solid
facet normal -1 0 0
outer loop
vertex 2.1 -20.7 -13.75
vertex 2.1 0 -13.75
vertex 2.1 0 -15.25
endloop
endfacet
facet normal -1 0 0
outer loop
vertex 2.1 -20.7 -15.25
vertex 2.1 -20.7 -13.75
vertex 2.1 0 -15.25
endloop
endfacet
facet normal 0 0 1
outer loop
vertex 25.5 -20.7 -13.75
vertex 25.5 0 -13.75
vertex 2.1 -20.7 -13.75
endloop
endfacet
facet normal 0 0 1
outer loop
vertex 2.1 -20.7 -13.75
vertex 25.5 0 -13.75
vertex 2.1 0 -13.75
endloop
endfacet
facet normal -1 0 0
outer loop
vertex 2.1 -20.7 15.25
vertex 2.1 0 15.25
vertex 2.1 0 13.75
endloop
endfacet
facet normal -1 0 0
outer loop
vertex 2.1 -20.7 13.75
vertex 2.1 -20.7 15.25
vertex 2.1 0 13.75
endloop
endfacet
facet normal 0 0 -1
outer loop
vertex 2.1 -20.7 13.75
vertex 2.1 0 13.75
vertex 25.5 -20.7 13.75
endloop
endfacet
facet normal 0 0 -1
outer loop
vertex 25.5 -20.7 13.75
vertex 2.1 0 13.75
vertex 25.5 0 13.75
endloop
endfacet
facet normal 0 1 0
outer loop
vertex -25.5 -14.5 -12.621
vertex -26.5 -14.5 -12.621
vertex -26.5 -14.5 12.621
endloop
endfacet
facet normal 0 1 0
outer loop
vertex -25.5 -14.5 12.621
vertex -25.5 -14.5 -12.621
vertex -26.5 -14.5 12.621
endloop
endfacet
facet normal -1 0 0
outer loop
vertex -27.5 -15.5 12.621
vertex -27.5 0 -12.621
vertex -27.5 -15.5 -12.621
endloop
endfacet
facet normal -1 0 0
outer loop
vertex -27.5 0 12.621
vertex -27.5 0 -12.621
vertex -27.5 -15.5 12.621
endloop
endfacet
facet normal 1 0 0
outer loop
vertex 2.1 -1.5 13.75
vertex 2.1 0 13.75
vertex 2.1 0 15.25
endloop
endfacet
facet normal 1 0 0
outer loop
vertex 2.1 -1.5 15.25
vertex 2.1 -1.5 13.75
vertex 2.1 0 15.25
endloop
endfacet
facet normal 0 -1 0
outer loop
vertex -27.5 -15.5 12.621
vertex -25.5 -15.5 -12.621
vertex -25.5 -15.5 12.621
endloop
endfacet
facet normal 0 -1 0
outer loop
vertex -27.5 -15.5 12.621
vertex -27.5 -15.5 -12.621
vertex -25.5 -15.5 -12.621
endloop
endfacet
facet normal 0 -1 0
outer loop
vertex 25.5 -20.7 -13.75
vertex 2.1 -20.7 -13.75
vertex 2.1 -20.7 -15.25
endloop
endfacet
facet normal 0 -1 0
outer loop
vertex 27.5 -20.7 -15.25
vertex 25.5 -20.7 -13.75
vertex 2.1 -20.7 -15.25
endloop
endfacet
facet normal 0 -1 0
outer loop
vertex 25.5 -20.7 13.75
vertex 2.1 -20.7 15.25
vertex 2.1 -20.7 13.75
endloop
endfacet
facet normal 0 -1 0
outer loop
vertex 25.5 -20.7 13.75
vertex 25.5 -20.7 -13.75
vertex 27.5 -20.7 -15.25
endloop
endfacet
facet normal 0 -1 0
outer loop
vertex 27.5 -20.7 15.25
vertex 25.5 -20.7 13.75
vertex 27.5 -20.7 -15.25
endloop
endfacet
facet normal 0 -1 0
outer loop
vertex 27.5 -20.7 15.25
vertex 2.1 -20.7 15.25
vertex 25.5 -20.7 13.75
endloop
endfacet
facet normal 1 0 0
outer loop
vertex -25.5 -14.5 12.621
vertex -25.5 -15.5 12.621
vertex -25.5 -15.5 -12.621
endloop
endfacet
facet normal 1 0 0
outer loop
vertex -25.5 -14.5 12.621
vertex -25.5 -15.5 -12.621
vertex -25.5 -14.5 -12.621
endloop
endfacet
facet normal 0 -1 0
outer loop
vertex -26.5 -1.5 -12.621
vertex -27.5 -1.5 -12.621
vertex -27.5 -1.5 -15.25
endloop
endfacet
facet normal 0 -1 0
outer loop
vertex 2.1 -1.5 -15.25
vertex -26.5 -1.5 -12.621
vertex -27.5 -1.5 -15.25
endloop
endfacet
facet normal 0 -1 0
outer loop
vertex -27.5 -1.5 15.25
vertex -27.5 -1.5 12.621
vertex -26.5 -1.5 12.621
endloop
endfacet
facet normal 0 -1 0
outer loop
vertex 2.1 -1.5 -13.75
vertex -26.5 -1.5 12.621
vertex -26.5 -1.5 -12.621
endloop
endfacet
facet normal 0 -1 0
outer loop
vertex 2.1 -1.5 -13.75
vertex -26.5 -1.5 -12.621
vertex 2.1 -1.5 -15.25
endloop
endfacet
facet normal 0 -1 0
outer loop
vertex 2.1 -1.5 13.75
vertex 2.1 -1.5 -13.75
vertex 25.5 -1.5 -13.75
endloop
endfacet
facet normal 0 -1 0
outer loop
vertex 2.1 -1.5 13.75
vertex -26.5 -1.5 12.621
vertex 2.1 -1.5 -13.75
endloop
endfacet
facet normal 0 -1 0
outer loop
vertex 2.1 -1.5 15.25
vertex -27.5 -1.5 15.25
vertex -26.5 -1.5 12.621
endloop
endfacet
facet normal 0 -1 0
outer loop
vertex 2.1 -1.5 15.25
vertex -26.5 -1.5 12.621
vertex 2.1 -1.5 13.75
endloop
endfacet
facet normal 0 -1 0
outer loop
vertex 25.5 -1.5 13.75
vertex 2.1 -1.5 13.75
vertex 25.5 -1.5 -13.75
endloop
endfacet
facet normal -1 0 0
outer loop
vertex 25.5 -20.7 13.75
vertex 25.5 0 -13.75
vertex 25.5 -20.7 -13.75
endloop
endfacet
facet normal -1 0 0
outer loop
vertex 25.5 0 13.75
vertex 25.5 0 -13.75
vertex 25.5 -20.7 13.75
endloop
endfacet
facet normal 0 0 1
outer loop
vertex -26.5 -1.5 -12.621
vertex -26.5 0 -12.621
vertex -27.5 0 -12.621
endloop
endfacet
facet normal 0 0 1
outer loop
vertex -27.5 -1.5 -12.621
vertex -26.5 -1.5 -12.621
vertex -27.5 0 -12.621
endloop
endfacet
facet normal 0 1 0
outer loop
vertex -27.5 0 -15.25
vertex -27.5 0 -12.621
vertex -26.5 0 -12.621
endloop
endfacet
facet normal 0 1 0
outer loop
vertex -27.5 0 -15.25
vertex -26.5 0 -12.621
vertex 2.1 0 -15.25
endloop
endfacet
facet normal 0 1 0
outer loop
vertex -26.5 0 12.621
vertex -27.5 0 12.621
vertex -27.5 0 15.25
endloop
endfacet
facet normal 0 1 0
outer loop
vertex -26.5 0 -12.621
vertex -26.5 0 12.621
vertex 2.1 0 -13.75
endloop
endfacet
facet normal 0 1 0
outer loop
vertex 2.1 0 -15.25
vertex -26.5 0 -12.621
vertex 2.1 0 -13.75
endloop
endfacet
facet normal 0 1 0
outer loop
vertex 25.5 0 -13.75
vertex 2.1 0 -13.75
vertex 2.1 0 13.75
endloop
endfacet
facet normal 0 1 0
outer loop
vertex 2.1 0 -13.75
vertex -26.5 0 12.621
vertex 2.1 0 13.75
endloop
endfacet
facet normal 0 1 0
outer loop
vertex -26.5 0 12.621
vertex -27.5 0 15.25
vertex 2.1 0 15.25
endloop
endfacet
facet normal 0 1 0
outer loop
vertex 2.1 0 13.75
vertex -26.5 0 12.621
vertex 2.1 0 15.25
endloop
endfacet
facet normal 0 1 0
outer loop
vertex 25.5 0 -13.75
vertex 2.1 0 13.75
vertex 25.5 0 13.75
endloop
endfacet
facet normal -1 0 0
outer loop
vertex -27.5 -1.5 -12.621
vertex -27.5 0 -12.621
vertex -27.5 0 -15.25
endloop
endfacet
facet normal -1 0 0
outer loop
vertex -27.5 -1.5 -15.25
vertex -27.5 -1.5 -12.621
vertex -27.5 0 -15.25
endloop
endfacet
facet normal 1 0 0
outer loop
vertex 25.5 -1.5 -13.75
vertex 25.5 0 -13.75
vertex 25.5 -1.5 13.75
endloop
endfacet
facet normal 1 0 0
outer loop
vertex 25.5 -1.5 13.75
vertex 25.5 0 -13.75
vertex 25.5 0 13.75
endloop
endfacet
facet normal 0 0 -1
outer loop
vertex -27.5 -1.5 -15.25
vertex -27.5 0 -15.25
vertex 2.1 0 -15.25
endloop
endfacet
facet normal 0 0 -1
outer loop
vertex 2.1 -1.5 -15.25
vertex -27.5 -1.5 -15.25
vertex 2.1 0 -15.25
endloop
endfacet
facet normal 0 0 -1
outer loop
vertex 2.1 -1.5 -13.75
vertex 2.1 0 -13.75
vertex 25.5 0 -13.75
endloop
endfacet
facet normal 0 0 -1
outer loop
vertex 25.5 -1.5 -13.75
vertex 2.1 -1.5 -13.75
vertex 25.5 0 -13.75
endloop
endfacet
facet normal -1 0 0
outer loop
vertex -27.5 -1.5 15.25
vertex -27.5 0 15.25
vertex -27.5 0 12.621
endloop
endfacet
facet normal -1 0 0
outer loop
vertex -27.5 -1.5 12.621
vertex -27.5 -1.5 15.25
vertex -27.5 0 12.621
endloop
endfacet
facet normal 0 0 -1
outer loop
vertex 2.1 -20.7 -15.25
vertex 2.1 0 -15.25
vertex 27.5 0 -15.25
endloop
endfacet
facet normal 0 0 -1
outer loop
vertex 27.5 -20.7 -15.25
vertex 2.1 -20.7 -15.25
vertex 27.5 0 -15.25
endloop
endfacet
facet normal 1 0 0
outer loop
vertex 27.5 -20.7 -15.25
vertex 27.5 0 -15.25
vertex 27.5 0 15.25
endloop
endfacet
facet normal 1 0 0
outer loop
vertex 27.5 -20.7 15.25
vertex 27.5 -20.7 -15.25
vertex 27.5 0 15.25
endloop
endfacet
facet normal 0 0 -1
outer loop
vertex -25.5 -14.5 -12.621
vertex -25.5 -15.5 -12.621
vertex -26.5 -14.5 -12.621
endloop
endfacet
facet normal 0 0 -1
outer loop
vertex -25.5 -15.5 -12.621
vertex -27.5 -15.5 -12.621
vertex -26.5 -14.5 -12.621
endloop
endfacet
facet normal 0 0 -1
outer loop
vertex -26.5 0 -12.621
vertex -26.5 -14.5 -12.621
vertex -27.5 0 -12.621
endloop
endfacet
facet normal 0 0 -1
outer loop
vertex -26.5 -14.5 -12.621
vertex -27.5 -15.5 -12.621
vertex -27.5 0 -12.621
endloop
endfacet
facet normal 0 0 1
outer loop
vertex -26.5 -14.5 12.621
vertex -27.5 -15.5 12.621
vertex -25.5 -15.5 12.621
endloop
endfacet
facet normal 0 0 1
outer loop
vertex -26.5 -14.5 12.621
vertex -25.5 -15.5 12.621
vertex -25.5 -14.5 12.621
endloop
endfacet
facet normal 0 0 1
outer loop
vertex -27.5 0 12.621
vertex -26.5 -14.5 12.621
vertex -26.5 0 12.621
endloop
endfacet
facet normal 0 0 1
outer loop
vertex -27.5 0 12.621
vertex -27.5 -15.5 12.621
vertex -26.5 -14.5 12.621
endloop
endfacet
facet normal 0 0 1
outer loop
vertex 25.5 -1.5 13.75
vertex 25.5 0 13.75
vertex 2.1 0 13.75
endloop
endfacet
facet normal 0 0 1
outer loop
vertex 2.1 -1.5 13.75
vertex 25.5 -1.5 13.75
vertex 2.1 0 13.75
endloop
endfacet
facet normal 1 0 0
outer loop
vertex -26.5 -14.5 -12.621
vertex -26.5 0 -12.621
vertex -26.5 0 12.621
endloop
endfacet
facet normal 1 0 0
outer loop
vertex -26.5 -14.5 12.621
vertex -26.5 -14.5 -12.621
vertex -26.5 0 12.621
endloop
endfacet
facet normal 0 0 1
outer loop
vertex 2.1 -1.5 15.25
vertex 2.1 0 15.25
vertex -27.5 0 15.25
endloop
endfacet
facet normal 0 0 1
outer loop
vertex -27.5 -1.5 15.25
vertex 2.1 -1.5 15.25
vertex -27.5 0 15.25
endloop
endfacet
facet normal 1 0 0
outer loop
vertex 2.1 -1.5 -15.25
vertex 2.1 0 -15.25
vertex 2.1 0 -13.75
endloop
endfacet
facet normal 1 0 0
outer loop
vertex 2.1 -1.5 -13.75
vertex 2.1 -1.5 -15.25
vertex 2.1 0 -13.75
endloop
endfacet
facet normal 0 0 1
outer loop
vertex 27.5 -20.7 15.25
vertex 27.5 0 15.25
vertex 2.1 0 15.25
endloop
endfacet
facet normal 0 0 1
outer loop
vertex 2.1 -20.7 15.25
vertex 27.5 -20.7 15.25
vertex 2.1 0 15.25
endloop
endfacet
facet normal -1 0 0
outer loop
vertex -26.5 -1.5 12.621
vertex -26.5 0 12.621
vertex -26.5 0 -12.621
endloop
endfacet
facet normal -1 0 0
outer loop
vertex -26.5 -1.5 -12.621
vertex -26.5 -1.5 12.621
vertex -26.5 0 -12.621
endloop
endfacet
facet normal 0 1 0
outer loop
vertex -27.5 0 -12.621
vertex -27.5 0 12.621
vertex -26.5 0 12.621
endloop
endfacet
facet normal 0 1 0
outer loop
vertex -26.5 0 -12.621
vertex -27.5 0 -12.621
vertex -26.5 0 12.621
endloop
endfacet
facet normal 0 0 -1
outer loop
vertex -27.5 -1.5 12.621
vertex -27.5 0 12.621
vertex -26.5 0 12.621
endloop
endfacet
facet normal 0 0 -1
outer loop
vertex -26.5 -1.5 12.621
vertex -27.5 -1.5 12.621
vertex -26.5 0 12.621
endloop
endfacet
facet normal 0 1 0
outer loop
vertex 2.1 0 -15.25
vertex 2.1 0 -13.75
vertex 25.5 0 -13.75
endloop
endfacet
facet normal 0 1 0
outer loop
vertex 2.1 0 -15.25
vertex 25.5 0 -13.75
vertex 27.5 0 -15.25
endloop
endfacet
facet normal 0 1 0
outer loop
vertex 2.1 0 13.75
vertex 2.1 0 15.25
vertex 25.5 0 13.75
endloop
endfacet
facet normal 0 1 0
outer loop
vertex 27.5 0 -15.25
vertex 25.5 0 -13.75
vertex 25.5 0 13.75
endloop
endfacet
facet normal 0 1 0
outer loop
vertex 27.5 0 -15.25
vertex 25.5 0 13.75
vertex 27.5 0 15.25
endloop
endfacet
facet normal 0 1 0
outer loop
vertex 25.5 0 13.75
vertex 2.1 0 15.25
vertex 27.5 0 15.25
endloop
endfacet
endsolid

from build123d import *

# Parameters (mm, degrees)
F0_W     = 1
F0_H     = 25.24283
F1_DEPTH = 15.5
F0_W_2   = 2
F0_H_2   = 27.5
F2_DEPTH = 20.7
F3_DEPTH = 1.5
F4_W     = 1
F4_H     = 25.24283
F5_DEPTH = 1


with BuildPart() as f1:
    # F0 (on Front) → F1 (new body)
    with BuildSketch(Plane.XZ):
        with Locations((-27, 0)):
            Rectangle(F0_W, F0_H)
    extrude(amount=F1_DEPTH)

    # F4 (on face) → F5 (join)
    with BuildSketch(Plane.YZ.offset(-26.5)):
        with Locations((-15, 0)):
            Rectangle(F4_W, F4_H)
    extrude(amount=F5_DEPTH)


with BuildPart() as f2:
    # F0 (on Front) → F2 (new body)
    with BuildSketch(Plane.XZ):
        Polygon((25.5, 13.75), (27.5, 13.75), (27.5, 15.25), (2.1, 15.25), (2.1, 13.75), align=None)
        Polygon((2.1, -15.25), (27.5, -15.25), (27.5, -13.75), (25.5, -13.75), (2.1, -13.75), align=None)
        with Locations((26.5, 0)):
            Rectangle(F0_W_2, F0_H_2)
    extrude(amount=F2_DEPTH)


with BuildPart() as f3:
    # F0 (on Front) → F3 (new body)
    with BuildSketch(Plane.XZ):
        Polygon((-27.5, -15.25), (2.1, -15.25), (2.1, -13.75), (25.5, -13.75), (25.5, 13.75), (2.1, 13.75), (2.1, 15.25), (-27.5, 15.25), (-27.5, 12.621415), (-26.5, 12.621415), (-26.5, -12.621415), (-27.5, -12.621415), align=None)
    extrude(amount=F3_DEPTH)


solid = Compound([f1.part, f2.part, f3.part])
